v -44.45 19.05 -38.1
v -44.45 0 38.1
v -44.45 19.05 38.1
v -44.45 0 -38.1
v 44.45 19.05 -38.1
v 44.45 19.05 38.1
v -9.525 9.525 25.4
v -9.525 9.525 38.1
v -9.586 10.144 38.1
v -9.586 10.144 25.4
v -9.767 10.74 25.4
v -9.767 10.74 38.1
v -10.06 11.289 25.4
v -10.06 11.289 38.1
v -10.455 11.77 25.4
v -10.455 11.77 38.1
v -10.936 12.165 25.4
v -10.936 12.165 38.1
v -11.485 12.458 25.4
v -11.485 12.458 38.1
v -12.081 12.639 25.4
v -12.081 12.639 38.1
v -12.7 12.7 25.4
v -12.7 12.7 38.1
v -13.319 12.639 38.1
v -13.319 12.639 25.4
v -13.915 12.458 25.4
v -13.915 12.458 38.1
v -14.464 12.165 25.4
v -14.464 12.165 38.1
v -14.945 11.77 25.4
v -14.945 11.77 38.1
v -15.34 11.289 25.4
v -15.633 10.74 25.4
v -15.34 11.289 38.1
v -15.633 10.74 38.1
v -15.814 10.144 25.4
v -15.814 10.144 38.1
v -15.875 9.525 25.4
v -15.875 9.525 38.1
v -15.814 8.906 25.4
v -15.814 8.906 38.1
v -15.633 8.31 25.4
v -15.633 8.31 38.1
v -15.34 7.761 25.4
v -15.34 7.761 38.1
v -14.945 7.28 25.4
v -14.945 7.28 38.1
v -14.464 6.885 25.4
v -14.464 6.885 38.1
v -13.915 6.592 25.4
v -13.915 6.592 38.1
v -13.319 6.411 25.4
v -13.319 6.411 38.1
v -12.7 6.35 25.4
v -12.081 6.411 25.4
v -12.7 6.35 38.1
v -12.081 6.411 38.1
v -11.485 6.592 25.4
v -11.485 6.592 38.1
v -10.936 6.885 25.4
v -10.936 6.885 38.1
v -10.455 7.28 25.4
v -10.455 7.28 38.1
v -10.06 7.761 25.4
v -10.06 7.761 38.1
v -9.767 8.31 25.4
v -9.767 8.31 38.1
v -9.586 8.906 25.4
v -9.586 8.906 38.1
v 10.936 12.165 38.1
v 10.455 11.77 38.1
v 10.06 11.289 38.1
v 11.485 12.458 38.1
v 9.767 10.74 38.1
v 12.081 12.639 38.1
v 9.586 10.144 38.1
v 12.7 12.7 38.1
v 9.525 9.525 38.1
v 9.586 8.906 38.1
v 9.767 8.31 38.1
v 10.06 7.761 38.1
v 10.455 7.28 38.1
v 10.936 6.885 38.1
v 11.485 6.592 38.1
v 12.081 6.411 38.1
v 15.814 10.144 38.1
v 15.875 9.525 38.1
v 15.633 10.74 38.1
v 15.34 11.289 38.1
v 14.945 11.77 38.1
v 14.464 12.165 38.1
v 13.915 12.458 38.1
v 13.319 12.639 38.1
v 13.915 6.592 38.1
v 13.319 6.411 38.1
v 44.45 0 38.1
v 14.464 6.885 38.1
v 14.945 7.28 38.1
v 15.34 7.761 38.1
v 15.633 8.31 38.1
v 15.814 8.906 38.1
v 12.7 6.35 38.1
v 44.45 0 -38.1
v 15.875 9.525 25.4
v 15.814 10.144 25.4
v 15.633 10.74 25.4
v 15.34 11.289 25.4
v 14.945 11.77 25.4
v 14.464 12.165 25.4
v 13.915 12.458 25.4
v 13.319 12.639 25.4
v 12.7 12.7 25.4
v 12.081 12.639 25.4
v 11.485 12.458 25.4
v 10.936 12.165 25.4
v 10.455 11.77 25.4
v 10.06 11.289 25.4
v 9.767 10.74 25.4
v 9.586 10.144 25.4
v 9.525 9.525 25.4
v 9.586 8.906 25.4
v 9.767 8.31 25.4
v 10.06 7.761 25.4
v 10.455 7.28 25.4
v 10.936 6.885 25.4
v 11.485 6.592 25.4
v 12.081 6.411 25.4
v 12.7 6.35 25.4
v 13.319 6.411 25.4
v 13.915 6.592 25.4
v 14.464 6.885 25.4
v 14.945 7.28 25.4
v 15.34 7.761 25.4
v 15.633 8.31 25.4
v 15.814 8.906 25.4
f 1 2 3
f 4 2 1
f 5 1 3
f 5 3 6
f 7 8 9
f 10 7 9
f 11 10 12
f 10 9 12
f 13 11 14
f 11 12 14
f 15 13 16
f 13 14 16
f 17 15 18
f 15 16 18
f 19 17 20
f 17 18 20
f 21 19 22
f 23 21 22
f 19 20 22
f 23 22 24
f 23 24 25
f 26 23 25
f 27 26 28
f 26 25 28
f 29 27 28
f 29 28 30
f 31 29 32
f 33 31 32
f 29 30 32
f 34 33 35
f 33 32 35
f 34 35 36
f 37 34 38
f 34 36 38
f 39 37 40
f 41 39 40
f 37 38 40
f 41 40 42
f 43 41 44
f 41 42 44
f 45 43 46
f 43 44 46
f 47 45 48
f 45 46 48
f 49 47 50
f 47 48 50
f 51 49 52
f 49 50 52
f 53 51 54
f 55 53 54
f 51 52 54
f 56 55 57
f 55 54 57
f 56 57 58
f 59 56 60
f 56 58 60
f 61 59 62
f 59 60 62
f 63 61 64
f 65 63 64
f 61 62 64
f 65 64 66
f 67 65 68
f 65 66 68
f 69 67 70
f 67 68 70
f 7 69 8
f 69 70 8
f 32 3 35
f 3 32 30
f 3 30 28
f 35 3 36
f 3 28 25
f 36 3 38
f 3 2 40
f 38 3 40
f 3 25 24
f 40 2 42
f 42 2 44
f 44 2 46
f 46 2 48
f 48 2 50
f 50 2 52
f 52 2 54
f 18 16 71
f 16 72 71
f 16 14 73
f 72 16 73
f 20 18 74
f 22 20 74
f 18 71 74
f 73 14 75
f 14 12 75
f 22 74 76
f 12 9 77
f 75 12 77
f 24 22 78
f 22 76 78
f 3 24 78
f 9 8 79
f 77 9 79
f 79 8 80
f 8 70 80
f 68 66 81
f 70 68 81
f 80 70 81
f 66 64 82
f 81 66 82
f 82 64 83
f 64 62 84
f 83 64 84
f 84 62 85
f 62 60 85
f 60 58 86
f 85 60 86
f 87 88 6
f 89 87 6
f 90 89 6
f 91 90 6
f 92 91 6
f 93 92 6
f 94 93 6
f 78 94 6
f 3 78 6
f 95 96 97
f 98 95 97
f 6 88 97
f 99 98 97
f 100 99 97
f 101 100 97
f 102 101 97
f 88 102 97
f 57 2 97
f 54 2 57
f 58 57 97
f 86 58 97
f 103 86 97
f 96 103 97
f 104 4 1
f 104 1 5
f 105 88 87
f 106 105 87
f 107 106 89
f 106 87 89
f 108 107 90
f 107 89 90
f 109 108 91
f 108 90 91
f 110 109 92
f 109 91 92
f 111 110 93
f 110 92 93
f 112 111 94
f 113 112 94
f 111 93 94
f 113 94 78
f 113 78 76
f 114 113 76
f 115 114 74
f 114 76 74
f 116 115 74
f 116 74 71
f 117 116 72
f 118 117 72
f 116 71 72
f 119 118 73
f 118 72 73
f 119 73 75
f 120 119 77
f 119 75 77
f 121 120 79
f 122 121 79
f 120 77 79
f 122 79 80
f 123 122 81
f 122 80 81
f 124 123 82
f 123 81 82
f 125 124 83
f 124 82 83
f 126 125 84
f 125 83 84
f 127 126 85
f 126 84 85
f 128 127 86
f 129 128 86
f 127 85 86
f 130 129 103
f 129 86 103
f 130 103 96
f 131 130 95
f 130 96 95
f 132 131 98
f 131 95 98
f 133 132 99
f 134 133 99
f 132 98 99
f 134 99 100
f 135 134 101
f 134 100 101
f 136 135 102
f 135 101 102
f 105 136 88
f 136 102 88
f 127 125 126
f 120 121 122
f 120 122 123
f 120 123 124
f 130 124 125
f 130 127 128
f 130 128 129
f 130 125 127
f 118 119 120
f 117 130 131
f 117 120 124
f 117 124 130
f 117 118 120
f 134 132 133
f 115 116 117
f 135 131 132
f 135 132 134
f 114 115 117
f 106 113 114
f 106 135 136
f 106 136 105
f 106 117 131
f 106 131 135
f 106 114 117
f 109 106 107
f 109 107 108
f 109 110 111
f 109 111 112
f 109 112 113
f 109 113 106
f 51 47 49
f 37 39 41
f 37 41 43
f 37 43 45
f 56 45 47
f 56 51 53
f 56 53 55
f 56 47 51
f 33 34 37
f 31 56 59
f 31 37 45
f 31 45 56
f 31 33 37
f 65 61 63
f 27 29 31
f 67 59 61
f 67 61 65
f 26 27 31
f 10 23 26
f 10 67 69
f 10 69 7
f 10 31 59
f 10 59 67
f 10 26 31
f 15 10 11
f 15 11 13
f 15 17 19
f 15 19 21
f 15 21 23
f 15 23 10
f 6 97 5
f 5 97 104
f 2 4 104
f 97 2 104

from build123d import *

# Parameters (mm, degrees)
SKETCH1_W           = 88.9
SKETCH1_H           = 76.2
BOSS_EXTRUDE1_DEPTH = 19.05
SKETCH2_R           = 3.175
CUT_EXTRUDE1_DEPTH  = 12.7


with BuildPart() as part:
    # Sketch1 → Boss-Extrude1 (new body)
    with BuildSketch(Plane(origin=(0, 0, 0), x_dir=(1, 0, 0), z_dir=(0, 1, 0))):
        Rectangle(SKETCH1_W, SKETCH1_H)
    extrude(amount=BOSS_EXTRUDE1_DEPTH)

    # Sketch2 → Cut-Extrude1 (cut)
    with BuildSketch(Plane.XY.offset(38.1)):
        with Locations((-12.7, 9.525)):
            Circle(SKETCH2_R)
        with Locations((12.7, 9.525)):
            Circle(SKETCH2_R)
    extrude(amount=-CUT_EXTRUDE1_DEPTH, mode=Mode.SUBTRACT)


solid = part.part
